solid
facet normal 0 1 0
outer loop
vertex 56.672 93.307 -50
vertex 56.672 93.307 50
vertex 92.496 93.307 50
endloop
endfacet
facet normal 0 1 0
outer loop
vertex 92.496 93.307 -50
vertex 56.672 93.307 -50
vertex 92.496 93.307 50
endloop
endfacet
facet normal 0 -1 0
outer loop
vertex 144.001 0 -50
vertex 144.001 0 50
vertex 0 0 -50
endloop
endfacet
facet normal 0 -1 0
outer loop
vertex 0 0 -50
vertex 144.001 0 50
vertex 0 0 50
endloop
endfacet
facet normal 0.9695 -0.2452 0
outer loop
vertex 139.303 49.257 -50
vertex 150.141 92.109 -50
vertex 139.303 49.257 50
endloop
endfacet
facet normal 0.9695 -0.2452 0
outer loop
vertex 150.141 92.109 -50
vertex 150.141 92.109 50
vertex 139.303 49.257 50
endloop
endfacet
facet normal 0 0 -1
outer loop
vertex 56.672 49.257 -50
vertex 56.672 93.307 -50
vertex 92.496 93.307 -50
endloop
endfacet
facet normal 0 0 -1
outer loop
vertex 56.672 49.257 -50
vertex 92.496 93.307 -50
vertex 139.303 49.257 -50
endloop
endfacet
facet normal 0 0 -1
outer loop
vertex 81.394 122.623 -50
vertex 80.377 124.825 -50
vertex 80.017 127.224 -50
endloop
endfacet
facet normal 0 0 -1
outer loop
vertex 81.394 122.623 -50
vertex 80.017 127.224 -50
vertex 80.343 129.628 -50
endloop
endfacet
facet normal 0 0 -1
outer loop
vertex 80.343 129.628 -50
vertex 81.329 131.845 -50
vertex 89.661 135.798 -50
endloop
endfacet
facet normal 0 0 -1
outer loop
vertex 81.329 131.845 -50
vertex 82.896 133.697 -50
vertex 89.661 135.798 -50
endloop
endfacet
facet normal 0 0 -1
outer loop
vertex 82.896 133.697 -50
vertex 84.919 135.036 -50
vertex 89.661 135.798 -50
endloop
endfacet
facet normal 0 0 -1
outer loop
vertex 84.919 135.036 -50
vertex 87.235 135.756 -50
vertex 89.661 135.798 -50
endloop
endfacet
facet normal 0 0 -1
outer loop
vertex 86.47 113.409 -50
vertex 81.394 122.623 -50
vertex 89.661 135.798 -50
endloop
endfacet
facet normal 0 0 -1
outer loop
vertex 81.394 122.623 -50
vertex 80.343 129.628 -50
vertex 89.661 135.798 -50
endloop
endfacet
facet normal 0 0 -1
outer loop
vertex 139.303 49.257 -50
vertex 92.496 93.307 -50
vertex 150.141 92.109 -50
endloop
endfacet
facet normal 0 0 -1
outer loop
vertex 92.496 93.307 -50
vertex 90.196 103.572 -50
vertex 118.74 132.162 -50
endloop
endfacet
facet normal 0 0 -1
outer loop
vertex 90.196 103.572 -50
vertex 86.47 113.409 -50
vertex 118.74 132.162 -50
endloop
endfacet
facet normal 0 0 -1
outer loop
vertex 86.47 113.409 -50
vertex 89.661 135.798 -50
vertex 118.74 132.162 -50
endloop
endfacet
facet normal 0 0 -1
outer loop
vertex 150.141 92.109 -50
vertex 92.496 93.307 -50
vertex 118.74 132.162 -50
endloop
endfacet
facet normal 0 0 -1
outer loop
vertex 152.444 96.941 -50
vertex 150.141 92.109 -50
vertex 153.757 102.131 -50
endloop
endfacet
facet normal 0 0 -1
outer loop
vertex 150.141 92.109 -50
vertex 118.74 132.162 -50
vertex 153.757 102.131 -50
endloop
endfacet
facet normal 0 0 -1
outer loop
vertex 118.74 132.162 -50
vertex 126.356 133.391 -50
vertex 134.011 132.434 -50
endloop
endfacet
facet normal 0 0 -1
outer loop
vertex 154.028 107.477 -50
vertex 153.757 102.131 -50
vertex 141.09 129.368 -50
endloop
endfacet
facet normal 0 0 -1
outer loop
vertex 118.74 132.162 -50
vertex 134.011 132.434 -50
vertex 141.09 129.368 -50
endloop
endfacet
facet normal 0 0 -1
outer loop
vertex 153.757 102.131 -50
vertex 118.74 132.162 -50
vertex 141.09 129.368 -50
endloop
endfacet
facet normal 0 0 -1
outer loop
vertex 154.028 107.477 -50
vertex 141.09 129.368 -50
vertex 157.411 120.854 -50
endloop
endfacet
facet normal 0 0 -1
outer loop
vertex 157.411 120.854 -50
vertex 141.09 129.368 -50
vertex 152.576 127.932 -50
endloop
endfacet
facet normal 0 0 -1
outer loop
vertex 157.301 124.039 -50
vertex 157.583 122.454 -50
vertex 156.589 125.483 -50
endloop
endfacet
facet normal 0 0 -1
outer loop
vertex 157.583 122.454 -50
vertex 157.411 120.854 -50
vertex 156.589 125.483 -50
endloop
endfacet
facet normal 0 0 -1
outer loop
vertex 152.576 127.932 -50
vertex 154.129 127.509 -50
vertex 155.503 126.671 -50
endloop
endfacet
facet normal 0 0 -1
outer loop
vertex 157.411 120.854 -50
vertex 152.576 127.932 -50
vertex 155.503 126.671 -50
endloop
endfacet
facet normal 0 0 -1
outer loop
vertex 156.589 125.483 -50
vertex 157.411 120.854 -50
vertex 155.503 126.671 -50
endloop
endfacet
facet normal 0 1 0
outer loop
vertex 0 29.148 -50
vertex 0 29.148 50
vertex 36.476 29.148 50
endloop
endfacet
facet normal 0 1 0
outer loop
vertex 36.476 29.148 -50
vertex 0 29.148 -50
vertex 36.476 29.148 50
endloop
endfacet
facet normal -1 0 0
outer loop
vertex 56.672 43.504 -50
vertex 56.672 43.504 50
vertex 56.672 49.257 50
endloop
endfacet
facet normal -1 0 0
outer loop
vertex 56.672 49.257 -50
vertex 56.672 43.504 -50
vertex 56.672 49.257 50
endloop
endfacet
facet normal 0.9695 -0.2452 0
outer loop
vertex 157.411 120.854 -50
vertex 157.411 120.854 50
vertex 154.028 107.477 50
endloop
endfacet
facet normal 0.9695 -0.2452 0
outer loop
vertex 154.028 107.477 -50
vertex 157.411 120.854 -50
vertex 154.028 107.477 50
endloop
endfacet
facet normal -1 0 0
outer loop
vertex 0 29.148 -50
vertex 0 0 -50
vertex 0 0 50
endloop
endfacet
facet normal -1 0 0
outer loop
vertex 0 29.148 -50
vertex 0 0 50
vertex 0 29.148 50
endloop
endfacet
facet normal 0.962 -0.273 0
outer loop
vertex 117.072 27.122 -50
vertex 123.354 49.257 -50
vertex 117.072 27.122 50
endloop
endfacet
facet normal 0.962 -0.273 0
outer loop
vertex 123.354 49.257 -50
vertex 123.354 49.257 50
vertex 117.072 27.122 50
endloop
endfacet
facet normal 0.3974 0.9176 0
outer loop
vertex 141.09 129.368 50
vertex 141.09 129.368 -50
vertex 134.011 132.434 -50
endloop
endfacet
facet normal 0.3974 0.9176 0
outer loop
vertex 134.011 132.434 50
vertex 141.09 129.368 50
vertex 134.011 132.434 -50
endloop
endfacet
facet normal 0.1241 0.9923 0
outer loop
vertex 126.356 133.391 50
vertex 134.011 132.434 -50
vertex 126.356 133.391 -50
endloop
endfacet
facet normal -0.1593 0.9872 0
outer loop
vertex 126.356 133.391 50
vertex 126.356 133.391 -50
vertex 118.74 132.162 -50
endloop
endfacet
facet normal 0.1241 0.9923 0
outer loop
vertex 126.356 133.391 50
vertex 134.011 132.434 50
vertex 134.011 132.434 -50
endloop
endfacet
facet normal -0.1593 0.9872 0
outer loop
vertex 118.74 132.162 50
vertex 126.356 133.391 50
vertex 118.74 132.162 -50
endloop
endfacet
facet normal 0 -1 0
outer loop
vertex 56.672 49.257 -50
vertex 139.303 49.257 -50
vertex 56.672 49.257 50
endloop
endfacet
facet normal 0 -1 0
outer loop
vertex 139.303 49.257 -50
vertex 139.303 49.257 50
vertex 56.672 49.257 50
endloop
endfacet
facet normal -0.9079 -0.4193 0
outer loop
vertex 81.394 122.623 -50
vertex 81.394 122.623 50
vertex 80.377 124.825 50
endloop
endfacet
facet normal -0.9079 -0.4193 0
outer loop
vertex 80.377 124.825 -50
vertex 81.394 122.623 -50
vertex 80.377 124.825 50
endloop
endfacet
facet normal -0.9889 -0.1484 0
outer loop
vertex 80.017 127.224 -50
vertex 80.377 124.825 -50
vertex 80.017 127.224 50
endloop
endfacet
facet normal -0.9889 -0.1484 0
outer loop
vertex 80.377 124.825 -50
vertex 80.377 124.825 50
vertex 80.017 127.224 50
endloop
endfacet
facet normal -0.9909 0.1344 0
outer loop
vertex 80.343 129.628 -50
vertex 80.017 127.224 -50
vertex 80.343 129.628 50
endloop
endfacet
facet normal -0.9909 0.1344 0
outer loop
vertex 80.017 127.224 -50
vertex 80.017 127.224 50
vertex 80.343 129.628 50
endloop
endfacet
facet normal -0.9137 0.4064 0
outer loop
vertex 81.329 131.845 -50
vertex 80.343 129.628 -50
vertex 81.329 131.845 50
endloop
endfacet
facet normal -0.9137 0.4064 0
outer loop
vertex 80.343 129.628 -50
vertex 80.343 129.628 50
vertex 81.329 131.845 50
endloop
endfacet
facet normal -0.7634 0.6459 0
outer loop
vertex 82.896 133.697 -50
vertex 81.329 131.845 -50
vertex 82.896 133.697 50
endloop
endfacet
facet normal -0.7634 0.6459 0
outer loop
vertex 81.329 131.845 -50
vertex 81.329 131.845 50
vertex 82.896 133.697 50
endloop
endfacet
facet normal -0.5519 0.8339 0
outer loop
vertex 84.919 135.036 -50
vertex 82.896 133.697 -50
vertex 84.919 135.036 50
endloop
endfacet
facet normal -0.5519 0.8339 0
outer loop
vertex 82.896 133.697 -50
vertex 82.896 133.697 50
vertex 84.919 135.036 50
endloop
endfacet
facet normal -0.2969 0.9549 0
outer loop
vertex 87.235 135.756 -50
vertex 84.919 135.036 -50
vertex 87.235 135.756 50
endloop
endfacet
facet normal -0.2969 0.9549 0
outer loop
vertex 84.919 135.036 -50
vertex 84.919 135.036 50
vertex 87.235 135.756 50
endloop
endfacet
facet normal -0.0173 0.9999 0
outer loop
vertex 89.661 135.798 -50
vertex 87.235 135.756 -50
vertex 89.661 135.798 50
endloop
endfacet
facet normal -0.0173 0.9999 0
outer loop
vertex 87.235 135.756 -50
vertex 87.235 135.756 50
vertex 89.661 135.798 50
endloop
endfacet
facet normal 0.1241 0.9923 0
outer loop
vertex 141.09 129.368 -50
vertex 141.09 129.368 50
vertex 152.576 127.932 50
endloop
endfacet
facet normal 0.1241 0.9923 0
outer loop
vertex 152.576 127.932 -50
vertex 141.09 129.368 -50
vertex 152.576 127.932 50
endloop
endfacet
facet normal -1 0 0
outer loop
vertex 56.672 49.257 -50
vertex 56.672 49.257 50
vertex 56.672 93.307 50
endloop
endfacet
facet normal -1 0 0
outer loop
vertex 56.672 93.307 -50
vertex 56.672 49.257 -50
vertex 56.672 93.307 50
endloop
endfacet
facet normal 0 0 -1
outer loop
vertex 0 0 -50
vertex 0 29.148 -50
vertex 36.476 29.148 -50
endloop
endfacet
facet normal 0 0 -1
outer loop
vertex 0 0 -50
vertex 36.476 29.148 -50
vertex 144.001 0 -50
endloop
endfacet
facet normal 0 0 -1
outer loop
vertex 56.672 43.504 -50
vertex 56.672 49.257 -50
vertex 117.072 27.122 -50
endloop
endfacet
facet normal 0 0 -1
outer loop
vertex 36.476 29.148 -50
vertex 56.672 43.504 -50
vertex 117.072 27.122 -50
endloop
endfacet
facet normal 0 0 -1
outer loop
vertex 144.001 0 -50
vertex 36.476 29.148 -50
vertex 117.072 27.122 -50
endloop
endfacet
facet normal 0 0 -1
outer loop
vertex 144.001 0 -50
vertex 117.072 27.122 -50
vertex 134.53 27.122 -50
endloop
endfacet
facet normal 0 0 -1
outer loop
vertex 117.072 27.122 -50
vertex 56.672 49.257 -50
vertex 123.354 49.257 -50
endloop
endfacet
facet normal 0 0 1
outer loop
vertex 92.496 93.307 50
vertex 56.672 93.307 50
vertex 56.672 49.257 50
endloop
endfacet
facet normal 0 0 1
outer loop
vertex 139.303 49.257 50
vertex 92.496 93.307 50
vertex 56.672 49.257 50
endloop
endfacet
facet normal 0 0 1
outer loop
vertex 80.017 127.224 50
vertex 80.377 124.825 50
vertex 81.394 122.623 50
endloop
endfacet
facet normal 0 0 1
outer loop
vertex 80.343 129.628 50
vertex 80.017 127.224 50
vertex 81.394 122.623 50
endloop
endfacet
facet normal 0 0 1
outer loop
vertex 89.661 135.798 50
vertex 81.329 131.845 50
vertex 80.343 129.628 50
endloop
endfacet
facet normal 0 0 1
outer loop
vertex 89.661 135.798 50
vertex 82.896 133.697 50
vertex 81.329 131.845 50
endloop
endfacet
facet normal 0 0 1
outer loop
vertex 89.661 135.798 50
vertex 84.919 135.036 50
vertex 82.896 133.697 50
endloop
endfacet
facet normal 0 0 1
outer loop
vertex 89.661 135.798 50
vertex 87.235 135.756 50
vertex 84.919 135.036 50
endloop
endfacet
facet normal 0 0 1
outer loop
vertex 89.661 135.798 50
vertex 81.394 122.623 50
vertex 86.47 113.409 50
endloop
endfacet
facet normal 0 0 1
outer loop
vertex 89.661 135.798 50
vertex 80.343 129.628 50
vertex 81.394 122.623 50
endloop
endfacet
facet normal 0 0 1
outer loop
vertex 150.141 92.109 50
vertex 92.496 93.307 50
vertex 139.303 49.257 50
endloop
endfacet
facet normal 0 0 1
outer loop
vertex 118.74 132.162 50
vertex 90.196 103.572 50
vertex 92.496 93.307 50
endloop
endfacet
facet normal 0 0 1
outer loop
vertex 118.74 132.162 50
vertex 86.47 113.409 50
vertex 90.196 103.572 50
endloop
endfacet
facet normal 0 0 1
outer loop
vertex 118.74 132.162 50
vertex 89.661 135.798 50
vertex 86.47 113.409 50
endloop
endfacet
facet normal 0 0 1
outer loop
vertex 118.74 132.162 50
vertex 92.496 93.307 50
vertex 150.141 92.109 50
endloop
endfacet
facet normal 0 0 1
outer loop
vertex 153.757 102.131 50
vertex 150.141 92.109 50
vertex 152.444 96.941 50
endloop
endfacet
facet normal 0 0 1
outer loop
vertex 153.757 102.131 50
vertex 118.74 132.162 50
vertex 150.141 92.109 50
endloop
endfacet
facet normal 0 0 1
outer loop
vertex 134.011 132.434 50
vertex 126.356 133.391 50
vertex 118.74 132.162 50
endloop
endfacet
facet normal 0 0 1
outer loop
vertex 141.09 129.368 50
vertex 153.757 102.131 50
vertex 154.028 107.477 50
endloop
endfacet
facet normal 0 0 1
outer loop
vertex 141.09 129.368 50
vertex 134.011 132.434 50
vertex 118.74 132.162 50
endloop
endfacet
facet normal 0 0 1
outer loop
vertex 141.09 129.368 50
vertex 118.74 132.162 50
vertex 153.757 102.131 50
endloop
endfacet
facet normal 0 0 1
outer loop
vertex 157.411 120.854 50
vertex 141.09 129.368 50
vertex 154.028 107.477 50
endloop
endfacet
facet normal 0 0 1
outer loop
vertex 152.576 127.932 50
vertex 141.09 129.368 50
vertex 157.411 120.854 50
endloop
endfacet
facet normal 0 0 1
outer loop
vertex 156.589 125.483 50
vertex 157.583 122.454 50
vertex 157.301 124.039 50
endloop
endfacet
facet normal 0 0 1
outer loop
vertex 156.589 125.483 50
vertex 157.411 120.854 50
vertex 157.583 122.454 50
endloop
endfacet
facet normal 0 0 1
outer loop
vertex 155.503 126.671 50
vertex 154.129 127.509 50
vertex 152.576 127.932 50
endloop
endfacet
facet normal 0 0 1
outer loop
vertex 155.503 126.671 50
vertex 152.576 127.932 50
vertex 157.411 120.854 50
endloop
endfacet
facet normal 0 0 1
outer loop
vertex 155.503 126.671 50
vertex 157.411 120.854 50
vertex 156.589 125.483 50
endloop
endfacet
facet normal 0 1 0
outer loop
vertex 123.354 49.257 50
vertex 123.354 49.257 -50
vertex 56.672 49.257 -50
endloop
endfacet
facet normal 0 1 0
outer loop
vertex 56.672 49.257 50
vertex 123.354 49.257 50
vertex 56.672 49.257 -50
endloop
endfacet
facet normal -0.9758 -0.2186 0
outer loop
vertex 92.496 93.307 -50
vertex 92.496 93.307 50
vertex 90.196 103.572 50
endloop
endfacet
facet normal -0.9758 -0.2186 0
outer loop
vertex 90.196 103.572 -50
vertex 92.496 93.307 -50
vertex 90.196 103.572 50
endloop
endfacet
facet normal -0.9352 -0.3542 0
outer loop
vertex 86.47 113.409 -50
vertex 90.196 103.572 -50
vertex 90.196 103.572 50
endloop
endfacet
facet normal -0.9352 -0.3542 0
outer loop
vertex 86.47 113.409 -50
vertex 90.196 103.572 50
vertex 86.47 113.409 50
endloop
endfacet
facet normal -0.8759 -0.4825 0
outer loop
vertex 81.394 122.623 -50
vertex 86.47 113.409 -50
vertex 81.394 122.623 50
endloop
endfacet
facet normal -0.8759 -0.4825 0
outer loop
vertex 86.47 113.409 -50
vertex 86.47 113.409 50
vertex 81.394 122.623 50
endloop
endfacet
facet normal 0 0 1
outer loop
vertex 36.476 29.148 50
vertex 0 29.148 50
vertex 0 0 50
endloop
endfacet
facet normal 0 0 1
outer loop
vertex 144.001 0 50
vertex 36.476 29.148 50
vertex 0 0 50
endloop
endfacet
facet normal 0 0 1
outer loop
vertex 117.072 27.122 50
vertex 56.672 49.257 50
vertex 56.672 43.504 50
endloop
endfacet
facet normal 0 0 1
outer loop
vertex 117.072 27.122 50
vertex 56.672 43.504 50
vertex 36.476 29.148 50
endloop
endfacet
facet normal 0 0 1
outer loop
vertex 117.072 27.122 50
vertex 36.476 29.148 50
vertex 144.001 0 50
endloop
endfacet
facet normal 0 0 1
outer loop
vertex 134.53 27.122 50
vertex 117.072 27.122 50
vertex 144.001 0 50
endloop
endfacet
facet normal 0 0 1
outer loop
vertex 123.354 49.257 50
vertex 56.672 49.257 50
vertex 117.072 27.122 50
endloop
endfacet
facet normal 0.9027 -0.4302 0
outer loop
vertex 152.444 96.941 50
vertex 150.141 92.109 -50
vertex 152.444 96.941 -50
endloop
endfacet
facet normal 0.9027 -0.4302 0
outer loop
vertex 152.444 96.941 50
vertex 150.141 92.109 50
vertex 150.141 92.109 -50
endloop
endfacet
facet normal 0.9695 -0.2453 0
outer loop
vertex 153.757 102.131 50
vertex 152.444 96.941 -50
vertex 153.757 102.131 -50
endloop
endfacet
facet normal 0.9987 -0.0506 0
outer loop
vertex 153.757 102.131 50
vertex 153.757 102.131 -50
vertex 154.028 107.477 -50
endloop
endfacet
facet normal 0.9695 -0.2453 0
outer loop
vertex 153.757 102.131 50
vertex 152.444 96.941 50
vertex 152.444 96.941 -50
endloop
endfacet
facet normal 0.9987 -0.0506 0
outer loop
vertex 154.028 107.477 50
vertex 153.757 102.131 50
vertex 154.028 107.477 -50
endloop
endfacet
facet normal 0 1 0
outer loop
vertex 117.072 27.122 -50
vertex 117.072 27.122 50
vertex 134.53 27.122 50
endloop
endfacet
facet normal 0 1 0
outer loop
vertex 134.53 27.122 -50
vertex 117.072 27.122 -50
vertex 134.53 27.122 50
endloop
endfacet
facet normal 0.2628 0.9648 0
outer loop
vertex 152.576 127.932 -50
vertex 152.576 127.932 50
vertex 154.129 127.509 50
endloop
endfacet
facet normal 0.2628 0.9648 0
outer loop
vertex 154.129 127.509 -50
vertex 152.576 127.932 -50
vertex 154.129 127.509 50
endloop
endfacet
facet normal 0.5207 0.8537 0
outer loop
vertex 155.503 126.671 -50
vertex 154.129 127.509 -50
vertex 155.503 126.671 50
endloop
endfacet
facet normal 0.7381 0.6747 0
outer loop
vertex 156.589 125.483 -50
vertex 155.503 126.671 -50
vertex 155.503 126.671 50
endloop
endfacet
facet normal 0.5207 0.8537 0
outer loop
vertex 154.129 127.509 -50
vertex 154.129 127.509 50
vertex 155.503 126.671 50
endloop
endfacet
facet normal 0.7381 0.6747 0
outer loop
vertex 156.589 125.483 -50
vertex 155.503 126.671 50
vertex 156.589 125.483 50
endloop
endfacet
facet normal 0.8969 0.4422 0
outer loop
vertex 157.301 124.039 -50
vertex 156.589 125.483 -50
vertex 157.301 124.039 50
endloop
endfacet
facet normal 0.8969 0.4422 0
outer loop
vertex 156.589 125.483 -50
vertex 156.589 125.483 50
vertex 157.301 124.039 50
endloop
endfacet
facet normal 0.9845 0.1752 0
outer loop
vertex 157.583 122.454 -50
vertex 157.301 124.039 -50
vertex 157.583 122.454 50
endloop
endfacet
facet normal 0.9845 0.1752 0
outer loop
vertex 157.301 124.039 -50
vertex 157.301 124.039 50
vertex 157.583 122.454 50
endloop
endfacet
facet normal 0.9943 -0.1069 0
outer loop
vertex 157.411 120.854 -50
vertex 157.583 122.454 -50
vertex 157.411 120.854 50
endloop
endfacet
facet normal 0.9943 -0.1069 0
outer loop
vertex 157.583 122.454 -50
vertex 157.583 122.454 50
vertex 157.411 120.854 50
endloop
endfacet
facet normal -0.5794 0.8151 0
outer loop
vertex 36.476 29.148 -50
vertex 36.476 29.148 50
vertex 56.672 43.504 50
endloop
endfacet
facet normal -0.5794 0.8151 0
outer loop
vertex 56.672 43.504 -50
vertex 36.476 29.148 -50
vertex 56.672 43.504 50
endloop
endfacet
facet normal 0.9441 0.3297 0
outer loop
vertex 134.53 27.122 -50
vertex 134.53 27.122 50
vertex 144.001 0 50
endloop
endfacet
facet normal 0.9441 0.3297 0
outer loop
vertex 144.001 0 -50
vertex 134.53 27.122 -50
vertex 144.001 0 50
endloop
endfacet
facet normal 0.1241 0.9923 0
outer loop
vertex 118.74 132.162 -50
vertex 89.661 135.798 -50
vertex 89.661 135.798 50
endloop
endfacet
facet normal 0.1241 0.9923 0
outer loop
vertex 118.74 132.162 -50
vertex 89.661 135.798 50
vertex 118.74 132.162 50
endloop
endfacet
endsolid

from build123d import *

# Parameters (mm, degrees)
SKETCH_1_R                     = 27.218239916
EXTRUDE_1_DEPTH                = 50
SPLIT_BODIES_1_SURFACE_1_BACK  = 231.852
SPLIT_BODIES_1_SURFACE_1_DEPTH = 463.704
SPLIT_BODIES_1_SURFACE_2_BACK  = 231.852
SPLIT_BODIES_1_SURFACE_2_DEPTH = 463.704


with BuildPart() as part:
    # 草图1 → 凸台-拉伸1 (new, symmetric)
    with BuildSketch(Plane.XY):
        with Locations((126.841, 106.1775)):
            Circle(SKETCH_1_R)
        with BuildLine():
            Line((36.476006197, 29.147891414), (56.67204093, 43.504108875))
            Line((56.67204093, 43.504108875), (56.67204093, 93.307484045))
            Line((56.67204093, 93.307484045), (92.496172884, 93.307484045))
            ThreePointArc((92.496172884, 93.307484045), (88.507151815, 108.556758389), (81.393508143, 122.622629526))
            ThreePointArc((81.393508143, 122.622629526), (81.328816917, 131.844883349), (89.661, 135.798220622))
            Line((89.661, 135.798220622), (152.57565846, 127.931864381))
            ThreePointArc((152.57565846, 127.931864381), (156.589044848, 125.482703859), (157.411382406, 120.853511867))
            Line((157.411382406, 120.853511867), (139.303205185, 49.257428232))
            Line((139.303205185, 49.257428232), (123.353516134, 49.257428232))
            Line((123.353516134, 49.257428232), (117.072161438, 27.122156161))
            Line((117.072161438, 27.122156161), (134.529857437, 27.122156161))
            Line((134.529857437, 27.122156161), (144.001, 0))
            Line((144.001, 0), (0, 0))
            Line((0, 0), (0, 29.147891414))
            Line((0, 29.147891414), (36.476006197, 29.147891414))
        make_face()
    extrude(amount=EXTRUDE_1_DEPTH, both=True)


with BuildPart() as body_2:
    # Split Bodies 1: the piece behind the surface
    add(part.part)
    # Split Bodies 1 surface: a surface, the sketch's curves swept straight by 463.704 mm
    with BuildLine(Plane.XY.offset(50).offset(-SPLIT_BODIES_1_SURFACE_1_BACK), mode=Mode.PRIVATE) as split_bodies_1_surface_1_path:
        Line((123.353516134, 49.257428232), (56.67204093, 49.257428232))
    split_bodies_1_surface_1 = Shell.extrude(split_bodies_1_surface_1_path.wire(), (0 * SPLIT_BODIES_1_SURFACE_1_DEPTH, 0 * SPLIT_BODIES_1_SURFACE_1_DEPTH, 1 * SPLIT_BODIES_1_SURFACE_1_DEPTH))
    split(bisect_by=split_bodies_1_surface_1, keep=Keep.BOTTOM)


with BuildPart() as part_1:
    add(part.part)

    # Split Bodies 1: split by a surface, the side it looks to stays
    # Split Bodies 1 surface: a surface, the sketch's curves swept straight by 463.704 mm
    with BuildLine(Plane.XY.offset(50).offset(-SPLIT_BODIES_1_SURFACE_2_BACK), mode=Mode.PRIVATE) as split_bodies_1_surface_2_path:
        Line((123.353516134, 49.257428232), (56.67204093, 49.257428232))
    split_bodies_1_surface_2 = Shell.extrude(split_bodies_1_surface_2_path.wire(), (0 * SPLIT_BODIES_1_SURFACE_2_DEPTH, 0 * SPLIT_BODIES_1_SURFACE_2_DEPTH, 1 * SPLIT_BODIES_1_SURFACE_2_DEPTH))
    split(bisect_by=split_bodies_1_surface_2, keep=Keep.TOP)


solid = Compound([body_2.part, part_1.part])
